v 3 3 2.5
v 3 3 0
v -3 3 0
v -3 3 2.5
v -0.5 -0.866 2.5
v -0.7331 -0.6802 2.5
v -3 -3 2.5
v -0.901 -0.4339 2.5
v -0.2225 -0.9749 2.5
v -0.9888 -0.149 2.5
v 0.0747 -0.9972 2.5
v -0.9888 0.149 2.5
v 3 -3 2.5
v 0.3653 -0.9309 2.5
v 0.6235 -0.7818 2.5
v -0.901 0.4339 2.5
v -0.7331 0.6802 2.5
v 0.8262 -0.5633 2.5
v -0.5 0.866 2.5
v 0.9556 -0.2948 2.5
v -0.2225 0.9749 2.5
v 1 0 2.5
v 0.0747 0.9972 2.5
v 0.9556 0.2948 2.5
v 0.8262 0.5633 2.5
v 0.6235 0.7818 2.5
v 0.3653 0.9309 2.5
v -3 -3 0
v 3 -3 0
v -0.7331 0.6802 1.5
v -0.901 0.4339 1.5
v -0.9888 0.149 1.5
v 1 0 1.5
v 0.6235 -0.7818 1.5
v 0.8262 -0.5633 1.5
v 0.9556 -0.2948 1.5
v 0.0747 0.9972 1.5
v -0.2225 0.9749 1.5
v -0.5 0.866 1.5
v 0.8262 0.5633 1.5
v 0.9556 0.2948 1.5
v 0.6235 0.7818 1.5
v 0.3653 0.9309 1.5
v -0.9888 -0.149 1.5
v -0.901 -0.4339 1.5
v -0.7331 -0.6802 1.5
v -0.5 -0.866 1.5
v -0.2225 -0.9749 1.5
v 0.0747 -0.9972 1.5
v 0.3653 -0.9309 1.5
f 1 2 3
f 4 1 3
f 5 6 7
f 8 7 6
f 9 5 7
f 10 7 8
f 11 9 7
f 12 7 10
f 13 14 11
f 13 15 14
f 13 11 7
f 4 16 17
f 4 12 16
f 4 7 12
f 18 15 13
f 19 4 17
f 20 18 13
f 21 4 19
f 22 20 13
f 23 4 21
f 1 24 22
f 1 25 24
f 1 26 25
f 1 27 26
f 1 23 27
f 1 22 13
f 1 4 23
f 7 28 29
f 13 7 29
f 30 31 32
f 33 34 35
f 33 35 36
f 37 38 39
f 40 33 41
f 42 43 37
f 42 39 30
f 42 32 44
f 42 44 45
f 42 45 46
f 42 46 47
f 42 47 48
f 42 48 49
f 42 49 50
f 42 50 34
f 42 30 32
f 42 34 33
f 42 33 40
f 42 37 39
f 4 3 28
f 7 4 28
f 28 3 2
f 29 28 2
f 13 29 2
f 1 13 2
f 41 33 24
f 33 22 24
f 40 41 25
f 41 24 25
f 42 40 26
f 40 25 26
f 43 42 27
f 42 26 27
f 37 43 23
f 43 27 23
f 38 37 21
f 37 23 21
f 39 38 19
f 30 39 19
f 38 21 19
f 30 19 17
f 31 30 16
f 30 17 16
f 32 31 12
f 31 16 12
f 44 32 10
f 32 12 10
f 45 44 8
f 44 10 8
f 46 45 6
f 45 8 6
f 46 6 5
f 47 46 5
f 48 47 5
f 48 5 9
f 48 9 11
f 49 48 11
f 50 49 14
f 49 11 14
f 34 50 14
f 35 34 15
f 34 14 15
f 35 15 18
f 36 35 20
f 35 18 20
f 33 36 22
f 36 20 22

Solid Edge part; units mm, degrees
sketch "Sketch1" plane through (0, 0, 0) normal (0, 0, 1) x (1, 0, 0)
  line L0 (-3, -3) -> (3, -3)
  line L1 (3, -3) -> (3, 3)
  line L2 (3, 3) -> (-3, 3)
  line L3 (-3, 3) -> (-3, -3)
extrude "Protrusion1" add sketch "Sketch1" along normal blind 2.5
sketch "Sketch2" plane through (0, 0, 2.5) normal (0, 0, 1) x (1, 0, 0)
  circle A0 centre (0, 0) radius 1
extrude "ExtrudedCutout_2" cut sketch "Sketch2" against normal blind 1
properties material "ABS Plastic, high impact"
